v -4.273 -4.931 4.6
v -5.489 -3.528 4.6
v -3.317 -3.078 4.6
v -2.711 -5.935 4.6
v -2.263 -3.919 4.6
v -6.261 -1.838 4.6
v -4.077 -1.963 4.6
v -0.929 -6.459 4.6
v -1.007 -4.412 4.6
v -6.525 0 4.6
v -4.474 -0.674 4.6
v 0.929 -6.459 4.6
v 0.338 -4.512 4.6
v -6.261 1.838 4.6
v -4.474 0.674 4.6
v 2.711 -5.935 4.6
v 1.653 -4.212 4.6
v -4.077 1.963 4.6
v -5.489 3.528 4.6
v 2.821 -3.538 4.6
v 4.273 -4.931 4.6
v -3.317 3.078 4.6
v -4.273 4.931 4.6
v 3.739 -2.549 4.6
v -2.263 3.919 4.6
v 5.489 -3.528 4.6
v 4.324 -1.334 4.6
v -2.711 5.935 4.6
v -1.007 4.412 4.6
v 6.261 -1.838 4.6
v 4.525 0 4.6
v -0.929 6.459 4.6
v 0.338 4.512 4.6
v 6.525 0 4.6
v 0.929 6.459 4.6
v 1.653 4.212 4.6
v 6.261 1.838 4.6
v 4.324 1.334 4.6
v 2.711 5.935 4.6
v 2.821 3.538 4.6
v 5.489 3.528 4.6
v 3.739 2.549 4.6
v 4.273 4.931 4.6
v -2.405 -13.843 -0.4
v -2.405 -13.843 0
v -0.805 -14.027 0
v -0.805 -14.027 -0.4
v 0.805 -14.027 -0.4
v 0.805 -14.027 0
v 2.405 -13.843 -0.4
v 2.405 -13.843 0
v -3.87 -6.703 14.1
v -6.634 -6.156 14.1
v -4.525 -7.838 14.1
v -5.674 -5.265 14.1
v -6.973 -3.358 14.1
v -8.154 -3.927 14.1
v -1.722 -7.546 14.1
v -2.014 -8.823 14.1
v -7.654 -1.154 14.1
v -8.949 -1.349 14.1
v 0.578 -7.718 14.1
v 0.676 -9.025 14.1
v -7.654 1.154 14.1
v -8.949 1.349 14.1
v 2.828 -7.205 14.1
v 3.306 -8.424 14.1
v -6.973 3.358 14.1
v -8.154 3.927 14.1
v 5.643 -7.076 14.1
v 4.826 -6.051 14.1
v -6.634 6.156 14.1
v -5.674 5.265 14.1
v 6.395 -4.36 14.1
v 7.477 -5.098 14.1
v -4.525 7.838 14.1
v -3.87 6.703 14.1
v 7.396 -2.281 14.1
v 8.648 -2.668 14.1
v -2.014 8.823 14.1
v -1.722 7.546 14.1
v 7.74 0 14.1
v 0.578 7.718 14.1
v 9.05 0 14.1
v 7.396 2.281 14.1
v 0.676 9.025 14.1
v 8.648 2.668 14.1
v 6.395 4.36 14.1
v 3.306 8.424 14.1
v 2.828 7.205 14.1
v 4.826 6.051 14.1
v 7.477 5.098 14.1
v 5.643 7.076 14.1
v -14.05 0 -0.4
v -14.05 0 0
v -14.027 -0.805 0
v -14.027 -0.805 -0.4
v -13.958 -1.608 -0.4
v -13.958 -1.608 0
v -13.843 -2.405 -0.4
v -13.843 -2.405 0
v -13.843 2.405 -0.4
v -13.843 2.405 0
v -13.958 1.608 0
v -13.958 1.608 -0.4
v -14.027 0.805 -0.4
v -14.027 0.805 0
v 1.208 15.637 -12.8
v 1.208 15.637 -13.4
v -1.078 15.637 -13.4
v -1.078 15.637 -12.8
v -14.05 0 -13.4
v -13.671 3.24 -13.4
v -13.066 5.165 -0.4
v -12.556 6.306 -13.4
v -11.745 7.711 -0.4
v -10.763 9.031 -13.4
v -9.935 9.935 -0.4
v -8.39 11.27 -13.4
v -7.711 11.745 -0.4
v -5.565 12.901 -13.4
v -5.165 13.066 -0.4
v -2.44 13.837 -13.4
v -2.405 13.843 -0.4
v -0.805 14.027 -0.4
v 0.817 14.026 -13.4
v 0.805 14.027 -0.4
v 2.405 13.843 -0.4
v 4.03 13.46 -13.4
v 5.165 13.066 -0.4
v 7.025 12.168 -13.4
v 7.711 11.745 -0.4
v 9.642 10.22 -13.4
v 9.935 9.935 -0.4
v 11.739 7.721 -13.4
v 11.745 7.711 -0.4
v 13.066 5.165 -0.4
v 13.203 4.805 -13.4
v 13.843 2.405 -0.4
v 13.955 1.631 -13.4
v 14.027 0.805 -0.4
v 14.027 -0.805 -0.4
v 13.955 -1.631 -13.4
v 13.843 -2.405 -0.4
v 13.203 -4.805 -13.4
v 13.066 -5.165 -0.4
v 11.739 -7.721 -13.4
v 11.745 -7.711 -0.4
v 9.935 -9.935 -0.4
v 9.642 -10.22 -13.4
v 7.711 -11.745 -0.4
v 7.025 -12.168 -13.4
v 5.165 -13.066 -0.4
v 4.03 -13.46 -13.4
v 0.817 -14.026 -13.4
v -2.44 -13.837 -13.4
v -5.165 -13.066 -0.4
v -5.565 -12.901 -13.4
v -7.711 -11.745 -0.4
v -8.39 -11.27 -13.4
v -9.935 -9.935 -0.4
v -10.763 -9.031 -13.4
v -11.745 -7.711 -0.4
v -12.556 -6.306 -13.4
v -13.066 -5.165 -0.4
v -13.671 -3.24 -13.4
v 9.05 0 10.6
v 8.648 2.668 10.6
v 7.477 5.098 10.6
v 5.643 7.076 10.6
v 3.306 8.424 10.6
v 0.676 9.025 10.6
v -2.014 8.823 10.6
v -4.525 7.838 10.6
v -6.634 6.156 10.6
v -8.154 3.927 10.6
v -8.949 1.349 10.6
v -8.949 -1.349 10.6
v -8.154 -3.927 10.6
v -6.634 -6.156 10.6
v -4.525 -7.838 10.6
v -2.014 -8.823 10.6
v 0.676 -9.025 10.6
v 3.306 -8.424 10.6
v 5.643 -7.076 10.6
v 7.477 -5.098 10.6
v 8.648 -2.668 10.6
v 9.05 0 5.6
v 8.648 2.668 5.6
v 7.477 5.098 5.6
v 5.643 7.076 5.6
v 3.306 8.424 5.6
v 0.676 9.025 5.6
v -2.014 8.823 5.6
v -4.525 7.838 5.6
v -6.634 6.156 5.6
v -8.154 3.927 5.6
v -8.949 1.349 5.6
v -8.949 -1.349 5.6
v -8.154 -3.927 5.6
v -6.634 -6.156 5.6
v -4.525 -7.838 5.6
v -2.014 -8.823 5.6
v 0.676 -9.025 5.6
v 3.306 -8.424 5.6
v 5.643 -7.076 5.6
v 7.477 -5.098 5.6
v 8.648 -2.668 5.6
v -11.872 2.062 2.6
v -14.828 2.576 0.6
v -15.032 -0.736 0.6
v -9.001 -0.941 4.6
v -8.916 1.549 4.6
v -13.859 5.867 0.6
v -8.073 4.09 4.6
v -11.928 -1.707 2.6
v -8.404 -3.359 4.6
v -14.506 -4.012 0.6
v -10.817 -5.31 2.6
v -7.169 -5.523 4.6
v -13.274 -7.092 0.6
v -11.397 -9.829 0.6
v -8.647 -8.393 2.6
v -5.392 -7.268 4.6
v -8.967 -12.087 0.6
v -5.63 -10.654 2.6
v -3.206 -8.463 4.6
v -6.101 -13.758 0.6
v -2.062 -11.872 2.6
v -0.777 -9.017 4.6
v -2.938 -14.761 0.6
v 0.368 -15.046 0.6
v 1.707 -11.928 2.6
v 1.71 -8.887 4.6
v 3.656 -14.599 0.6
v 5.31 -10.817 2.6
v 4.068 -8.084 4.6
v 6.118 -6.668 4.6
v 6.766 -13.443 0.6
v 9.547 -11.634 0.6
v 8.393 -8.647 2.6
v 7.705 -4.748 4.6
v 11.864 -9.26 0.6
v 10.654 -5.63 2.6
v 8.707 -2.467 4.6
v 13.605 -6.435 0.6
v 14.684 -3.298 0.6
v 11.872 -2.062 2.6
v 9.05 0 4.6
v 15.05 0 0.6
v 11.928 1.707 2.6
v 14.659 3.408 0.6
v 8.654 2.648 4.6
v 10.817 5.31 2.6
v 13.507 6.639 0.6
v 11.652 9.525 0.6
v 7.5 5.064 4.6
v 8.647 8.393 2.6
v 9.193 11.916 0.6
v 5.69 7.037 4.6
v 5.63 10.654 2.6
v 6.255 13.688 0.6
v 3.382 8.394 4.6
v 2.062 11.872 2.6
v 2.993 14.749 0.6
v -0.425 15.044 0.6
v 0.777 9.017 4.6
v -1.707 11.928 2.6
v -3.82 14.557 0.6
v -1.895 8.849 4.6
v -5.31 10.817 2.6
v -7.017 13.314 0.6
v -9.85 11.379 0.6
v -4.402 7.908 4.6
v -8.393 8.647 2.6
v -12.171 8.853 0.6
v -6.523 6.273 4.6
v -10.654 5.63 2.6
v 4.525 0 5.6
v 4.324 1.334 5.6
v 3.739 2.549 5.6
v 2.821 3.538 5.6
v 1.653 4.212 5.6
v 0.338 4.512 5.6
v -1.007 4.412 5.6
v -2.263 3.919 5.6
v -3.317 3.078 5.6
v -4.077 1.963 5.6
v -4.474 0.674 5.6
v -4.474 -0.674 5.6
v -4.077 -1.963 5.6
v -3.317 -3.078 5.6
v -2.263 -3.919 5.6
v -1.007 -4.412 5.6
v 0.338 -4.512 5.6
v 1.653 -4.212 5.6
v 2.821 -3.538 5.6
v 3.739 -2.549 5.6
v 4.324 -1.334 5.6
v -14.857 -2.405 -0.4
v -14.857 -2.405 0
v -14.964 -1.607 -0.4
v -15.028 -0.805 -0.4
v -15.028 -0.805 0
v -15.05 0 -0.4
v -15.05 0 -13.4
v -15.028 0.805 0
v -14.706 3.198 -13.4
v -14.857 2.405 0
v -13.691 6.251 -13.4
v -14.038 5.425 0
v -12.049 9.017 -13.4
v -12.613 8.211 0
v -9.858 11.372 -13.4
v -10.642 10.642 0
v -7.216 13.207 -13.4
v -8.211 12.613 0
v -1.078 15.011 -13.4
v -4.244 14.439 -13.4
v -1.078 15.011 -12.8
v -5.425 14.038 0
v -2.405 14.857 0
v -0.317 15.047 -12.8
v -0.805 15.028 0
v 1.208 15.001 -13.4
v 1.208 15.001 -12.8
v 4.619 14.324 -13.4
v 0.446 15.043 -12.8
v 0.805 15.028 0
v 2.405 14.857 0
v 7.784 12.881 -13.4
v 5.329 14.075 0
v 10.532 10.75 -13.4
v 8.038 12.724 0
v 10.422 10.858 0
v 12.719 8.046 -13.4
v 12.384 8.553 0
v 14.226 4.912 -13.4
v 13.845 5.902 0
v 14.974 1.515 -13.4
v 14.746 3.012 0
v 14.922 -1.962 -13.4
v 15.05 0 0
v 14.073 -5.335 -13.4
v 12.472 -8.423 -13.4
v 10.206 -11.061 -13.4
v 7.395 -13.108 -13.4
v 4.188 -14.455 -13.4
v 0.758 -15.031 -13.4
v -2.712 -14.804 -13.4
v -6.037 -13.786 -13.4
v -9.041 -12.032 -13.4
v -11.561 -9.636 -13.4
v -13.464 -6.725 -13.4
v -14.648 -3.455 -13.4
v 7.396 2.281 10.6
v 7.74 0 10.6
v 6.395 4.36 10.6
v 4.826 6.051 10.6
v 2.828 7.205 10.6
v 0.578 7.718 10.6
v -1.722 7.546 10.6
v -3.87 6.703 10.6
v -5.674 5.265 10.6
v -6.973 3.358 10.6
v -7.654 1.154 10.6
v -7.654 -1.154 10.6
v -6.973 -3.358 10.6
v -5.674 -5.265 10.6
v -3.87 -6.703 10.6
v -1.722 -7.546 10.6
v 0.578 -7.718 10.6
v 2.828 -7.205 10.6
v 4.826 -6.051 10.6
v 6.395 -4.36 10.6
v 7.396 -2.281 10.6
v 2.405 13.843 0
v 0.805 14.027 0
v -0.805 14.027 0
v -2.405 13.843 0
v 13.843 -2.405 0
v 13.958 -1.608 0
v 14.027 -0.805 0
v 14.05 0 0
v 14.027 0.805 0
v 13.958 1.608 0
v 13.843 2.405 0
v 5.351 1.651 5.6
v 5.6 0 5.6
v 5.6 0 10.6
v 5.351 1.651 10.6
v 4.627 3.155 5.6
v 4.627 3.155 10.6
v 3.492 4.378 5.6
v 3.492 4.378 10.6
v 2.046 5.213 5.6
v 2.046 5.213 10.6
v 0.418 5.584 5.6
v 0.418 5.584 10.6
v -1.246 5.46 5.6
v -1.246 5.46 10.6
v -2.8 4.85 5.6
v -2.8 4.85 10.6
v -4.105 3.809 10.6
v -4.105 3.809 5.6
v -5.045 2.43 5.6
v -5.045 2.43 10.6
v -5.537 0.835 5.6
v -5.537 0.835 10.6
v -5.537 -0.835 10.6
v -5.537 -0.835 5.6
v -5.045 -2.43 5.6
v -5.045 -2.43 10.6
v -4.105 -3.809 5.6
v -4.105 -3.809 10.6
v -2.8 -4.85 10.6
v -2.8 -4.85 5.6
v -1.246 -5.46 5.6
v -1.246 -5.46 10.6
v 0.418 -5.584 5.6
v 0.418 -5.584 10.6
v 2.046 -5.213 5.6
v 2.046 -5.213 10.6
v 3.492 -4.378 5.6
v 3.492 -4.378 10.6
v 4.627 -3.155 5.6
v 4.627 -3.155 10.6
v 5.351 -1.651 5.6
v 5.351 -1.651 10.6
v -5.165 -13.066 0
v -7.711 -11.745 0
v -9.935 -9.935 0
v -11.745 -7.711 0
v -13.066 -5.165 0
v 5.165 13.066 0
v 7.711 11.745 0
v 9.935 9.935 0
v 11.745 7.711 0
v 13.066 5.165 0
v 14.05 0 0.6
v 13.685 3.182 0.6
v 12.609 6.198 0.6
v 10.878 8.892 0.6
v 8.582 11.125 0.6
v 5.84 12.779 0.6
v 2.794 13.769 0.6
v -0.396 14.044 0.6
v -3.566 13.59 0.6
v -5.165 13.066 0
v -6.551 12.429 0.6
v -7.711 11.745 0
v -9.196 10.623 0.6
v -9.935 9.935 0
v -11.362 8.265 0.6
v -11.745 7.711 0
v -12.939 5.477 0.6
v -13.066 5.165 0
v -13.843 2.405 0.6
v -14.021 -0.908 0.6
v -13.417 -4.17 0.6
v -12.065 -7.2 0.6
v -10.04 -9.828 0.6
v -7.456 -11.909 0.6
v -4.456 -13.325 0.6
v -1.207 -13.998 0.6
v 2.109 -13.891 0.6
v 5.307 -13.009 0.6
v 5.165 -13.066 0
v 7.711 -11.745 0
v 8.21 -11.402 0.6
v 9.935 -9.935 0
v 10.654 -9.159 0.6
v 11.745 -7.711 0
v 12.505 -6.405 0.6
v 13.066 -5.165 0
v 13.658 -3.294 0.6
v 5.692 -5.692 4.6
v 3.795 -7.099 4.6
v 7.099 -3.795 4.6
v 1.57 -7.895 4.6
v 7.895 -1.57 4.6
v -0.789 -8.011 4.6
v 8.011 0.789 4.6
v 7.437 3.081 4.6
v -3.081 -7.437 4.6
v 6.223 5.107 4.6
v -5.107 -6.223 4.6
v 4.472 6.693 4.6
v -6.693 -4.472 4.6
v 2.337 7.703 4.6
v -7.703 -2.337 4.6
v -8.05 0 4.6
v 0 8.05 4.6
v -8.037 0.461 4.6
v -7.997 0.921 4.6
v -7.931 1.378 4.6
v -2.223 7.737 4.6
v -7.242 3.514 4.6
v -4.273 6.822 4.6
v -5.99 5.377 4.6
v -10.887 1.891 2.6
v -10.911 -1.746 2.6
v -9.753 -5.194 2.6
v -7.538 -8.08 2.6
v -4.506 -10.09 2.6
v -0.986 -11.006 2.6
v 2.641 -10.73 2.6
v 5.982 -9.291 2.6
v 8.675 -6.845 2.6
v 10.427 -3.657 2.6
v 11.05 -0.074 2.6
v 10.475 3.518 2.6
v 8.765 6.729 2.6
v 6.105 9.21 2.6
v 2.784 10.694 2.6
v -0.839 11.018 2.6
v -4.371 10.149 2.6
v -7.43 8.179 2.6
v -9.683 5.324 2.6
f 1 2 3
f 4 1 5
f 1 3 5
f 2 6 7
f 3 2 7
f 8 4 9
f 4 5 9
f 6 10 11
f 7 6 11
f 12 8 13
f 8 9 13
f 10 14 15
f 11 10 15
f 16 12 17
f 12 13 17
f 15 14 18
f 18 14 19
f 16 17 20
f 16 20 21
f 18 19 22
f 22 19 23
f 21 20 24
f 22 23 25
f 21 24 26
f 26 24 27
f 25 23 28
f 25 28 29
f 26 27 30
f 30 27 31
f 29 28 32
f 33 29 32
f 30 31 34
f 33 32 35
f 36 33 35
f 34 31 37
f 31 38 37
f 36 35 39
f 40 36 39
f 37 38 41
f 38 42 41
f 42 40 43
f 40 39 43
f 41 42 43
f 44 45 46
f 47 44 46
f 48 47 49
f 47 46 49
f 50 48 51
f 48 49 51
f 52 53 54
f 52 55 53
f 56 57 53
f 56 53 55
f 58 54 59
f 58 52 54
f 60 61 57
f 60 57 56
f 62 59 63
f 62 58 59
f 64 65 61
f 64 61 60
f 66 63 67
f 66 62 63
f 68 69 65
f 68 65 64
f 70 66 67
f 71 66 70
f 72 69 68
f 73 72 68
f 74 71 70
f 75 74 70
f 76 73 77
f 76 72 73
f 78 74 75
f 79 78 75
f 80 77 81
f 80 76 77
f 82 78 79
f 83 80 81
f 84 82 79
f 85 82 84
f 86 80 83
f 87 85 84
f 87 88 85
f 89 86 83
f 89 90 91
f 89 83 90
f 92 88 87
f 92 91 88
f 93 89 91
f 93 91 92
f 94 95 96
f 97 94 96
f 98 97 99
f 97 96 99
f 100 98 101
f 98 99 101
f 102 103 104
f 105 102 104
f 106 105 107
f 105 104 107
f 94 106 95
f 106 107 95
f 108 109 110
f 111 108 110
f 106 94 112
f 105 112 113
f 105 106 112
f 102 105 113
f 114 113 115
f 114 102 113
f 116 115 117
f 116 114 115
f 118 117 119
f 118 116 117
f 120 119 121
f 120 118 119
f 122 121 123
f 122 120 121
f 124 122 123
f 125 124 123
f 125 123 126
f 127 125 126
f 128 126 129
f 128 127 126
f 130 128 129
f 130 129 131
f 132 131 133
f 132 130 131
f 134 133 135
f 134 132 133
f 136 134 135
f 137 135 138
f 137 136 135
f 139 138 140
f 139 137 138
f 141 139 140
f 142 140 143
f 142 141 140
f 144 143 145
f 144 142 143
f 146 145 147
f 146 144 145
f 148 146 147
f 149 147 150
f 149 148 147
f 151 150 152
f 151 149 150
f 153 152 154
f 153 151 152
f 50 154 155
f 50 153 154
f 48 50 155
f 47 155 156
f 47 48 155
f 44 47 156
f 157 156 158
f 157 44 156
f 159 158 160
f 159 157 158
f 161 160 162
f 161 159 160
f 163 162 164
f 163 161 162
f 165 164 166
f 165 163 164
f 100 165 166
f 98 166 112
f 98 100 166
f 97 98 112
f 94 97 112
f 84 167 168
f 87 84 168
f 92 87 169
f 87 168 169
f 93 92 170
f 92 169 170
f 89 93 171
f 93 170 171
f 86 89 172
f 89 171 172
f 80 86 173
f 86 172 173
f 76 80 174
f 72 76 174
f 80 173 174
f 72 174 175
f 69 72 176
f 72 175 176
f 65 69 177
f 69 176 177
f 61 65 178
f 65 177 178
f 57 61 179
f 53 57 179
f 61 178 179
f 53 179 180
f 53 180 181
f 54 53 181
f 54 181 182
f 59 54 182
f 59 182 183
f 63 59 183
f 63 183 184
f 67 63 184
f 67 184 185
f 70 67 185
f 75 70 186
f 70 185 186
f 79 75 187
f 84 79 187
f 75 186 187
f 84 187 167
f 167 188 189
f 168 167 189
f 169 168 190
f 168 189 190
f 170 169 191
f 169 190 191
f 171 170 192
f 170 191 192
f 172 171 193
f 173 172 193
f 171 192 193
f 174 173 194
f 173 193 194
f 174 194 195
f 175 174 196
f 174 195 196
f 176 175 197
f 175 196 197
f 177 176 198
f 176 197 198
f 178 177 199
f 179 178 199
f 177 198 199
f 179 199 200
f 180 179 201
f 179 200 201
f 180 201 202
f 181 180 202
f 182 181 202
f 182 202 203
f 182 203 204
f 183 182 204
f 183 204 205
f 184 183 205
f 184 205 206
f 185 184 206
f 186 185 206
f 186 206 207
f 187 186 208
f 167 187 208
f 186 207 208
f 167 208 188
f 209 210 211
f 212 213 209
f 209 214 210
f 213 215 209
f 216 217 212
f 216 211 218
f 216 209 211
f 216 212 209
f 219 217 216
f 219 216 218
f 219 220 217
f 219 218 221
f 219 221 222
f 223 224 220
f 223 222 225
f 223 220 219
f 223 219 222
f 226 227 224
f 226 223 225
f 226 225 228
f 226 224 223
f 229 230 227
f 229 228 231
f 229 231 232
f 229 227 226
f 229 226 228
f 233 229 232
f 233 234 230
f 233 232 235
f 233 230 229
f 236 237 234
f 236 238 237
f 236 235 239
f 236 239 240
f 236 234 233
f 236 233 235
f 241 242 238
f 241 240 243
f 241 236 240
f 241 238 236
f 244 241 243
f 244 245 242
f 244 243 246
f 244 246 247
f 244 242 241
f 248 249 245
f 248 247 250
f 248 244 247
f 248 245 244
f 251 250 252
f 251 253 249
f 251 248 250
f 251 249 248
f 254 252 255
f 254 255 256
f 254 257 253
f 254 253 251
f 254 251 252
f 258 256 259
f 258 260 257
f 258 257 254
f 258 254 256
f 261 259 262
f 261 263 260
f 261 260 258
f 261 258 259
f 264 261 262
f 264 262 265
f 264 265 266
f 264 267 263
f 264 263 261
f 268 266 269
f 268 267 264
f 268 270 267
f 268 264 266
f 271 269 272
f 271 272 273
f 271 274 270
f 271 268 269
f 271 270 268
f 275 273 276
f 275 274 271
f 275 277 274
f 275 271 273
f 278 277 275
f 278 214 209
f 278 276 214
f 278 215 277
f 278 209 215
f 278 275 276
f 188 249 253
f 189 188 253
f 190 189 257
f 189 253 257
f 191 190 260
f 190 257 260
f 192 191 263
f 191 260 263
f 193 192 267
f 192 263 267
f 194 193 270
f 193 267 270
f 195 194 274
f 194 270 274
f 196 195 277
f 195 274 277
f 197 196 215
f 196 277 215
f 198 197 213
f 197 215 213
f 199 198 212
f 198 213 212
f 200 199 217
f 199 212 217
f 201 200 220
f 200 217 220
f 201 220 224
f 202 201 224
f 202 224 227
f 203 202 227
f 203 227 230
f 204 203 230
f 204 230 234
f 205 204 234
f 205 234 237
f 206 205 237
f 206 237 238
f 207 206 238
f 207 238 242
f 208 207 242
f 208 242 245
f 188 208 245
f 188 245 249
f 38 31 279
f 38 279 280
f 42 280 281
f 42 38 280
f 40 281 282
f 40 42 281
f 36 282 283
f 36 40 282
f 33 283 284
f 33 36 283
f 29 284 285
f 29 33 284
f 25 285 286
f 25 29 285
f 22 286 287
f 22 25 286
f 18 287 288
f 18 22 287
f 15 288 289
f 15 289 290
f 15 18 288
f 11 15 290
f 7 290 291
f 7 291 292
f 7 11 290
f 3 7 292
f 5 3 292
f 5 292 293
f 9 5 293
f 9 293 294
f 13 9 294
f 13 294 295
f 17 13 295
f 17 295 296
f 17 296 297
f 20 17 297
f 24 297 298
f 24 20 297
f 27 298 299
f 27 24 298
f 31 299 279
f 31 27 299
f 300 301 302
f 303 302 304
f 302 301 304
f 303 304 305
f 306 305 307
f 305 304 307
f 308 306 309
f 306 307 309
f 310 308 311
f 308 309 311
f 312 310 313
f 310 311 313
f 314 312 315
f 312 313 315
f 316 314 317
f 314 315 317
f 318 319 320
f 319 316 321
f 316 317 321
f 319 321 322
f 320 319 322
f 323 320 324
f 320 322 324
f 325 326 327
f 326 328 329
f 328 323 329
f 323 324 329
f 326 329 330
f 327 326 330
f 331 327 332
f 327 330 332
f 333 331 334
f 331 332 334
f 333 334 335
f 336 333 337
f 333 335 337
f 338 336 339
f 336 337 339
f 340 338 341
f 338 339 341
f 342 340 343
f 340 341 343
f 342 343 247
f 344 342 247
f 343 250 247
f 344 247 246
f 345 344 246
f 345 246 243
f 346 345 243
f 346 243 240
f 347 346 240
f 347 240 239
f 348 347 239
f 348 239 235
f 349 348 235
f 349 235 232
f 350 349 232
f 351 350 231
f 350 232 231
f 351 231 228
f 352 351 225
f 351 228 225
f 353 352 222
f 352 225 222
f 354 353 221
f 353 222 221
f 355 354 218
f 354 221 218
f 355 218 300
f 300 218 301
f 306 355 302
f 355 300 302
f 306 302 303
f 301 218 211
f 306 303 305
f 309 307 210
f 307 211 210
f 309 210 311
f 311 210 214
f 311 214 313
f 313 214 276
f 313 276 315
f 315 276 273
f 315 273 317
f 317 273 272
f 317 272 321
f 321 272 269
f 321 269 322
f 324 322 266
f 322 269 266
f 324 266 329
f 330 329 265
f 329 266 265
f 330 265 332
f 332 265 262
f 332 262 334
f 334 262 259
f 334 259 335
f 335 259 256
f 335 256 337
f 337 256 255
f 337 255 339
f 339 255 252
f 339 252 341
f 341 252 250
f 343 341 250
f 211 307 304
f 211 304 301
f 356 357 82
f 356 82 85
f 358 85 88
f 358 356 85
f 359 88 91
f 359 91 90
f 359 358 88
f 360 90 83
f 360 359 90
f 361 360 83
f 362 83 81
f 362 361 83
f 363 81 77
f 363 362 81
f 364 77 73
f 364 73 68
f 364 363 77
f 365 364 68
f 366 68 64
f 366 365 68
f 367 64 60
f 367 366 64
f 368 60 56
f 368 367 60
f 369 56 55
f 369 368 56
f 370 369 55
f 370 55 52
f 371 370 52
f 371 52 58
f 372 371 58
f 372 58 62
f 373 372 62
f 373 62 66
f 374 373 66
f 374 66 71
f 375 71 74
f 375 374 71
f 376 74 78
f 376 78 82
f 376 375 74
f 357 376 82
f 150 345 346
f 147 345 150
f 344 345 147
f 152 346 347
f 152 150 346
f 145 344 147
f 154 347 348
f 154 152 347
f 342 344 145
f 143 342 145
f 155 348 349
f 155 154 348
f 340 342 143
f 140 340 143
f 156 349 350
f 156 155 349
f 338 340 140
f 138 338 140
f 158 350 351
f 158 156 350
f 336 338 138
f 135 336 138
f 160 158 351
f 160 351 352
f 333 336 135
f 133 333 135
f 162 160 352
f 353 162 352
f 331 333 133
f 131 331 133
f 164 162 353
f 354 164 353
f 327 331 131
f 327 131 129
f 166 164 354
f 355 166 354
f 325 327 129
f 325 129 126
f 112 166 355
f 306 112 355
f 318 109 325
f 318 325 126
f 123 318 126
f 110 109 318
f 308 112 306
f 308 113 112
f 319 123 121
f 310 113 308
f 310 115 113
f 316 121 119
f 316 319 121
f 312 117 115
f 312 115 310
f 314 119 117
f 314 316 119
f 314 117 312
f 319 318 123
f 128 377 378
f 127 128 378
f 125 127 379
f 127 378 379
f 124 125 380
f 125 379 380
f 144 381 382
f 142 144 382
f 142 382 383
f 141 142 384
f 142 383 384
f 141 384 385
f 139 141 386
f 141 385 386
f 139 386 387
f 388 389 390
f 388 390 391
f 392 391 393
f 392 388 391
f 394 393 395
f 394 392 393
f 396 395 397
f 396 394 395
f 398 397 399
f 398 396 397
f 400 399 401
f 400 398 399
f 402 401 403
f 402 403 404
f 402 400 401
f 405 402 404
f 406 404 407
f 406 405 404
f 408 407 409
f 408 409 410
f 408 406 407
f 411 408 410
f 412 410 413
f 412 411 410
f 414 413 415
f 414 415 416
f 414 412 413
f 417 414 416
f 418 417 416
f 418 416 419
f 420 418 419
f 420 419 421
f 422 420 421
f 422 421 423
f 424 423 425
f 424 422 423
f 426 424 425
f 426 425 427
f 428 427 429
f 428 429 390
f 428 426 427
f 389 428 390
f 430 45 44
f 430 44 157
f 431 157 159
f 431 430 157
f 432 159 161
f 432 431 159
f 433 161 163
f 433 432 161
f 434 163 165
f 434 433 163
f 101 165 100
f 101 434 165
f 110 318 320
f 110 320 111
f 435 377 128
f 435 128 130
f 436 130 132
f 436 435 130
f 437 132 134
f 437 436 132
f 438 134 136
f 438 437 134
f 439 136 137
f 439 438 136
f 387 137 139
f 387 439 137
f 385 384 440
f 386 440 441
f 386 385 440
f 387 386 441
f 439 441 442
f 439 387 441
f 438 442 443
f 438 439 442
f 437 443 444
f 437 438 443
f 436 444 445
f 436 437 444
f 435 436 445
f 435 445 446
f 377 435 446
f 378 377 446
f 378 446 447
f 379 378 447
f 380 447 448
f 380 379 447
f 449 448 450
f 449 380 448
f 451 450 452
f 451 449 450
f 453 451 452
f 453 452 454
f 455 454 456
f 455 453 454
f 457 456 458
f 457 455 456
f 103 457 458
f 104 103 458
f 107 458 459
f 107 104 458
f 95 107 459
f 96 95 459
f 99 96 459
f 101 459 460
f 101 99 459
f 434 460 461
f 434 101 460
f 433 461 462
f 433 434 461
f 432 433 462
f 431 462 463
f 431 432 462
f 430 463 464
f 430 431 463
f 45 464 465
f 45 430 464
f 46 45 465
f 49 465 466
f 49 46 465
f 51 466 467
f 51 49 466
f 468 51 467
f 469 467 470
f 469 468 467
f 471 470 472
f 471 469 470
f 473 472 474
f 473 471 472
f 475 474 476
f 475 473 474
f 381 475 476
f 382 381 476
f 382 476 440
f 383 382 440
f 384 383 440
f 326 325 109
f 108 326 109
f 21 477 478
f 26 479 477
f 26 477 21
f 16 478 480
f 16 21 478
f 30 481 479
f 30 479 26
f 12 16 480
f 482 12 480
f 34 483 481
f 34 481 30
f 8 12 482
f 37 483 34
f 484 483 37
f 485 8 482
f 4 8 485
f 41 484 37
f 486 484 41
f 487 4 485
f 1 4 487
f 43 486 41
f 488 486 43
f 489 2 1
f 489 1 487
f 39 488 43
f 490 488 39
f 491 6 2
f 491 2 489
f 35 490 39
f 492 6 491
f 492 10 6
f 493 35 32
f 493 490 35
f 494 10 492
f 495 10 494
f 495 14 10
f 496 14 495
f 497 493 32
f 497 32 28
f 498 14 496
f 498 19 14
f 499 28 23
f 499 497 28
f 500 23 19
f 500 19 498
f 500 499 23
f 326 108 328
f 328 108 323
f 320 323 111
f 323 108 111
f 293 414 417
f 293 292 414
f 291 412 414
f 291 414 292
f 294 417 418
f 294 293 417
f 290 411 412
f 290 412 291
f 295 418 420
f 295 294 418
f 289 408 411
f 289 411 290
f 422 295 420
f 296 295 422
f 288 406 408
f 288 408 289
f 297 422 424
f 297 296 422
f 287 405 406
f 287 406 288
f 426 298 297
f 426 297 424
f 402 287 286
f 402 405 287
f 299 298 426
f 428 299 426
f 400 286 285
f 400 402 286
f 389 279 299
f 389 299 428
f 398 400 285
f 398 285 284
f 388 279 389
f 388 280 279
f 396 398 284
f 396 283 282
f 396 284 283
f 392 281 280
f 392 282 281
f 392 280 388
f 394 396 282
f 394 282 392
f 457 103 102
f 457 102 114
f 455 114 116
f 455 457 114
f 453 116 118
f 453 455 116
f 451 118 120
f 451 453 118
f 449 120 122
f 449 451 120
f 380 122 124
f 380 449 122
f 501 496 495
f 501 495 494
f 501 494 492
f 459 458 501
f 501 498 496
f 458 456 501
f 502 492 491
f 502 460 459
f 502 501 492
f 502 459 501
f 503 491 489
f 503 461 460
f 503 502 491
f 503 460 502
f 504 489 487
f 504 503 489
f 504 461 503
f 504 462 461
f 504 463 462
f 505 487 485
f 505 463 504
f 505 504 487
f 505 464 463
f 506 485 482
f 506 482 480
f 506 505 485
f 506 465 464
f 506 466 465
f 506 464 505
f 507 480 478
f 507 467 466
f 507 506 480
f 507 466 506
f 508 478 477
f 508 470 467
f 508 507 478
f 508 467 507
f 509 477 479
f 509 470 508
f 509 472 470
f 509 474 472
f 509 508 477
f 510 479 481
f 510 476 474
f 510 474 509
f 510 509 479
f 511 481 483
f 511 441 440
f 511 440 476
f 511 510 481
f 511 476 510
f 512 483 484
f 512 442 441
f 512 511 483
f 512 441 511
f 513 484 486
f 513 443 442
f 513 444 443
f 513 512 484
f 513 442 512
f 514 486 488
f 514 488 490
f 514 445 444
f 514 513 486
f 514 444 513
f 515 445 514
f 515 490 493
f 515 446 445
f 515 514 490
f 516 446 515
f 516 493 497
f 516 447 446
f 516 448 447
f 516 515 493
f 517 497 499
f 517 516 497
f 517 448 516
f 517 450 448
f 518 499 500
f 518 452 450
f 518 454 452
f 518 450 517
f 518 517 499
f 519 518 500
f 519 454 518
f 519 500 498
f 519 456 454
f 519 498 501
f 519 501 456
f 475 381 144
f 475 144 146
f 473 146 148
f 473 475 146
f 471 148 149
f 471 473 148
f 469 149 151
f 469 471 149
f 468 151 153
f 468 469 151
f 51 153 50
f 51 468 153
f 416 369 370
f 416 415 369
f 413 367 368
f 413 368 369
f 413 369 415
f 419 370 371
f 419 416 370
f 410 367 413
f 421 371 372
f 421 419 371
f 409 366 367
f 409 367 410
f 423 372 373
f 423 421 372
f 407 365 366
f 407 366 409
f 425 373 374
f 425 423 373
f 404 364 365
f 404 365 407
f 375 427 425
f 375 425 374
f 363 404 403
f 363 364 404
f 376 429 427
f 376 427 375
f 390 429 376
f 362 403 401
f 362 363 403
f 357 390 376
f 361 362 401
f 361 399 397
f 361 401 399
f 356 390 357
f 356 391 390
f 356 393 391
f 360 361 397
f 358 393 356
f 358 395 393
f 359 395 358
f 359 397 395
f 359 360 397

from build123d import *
from build123d.topology import SkipClean

# Parameters (mm, degrees)
CROQUIS1_R               = 15.05
CROQUIS1_R_2             = 14.05
SALIENTE_EXTRUIR1_DEPTH  = 0.6
SALIENTE_EXTRUIR2_DEPTH  = 0.4
CROQUIS5_R               = 15.05
CROQUIS5_R_2             = 14.05
SALIENTE_EXTRUIR3_DEPTH  = 0.4
CROQUIS7_R               = 15.05
CROQUIS7_R_2             = 14.05
SALIENTE_EXTRUIR4_DEPTH  = 13
CROQUIS8_W               = 2.286340663
CROQUIS8_H               = 1.122176033
SALIENTE_EXTRUIR5_DEPTH  = 0.6
CROQUIS10_R              = 6.525
CROQUIS10_R_2            = 4.525
SALIENTE_EXTRUIR6_DEPTH  = 1
CROQUIS11_R              = 9.05
CROQUIS11_R_2            = 5.6
SALIENTE_EXTRUIR7_DEPTH  = 5
CROQUIS12_R              = 9.05
CROQUIS12_R_2            = 8.05
SALIENTE_EXTRUIR9_DEPTH  = 1
CROQUIS13_R              = 9.05
CROQUIS13_R_2            = 7.74
SALIENTE_EXTRUIR10_DEPTH = 3.5
CROQUIS14_R              = 8.05
CROQUIS14_R_2            = 6.525
SALIENTE_EXTRUIR11_DEPTH = 1


with BuildPart() as part:
    # Croquis1 → Saliente-Extruir1 (new body)
    with BuildSketch(Plane.XY):
        Circle(CROQUIS1_R)
        Circle(CROQUIS1_R_2, mode=Mode.SUBTRACT)
    extrude(amount=SALIENTE_EXTRUIR1_DEPTH)

    # Croquis2 → Saliente-Extruir2 (add)
    with SkipClean():  # the faces are left unmerged after this step: merging them gives an invalid solid
        with BuildSketch(Plane(origin=(0, 0, 0), x_dir=(-1, 0, 0), z_dir=(0, 0, -1))):
            with BuildLine():
                Line((-2.404789938, 14.856631023), (-2.404789938, 13.842669011))
                ThreePointArc((-2.404789938, 13.842669011), (0, 14.05), (2.404789938, 13.842669011))
                Line((2.404789938, 13.842669011), (2.404789938, 14.856631023))
                ThreePointArc((2.404789938, 14.856631023), (0, 15.05), (-2.404789938, 14.856631023))
            make_face()
            with BuildLine():
                Line((14.856631023, 2.404789938), (13.842669011, 2.404789938))
                ThreePointArc((13.842669011, 2.404789938), (14.05, 0), (13.842669011, -2.404789938))
                Line((13.842669011, -2.404789938), (14.856631023, -2.404789938))
                ThreePointArc((14.856631023, -2.404789938), (15.05, 0), (14.856631023, 2.404789938))
            make_face()
            with BuildLine():
                Line((2.404789938, -14.856631023), (2.404789938, -13.842669011))
                ThreePointArc((2.404789938, -13.842669011), (0, -14.05), (-2.404789938, -13.842669011))
                Line((-2.404789938, -13.842669011), (-2.404789938, -14.856631023))
                ThreePointArc((-2.404789938, -14.856631023), (0, -15.05), (2.404789938, -14.856631023))
            make_face()
            with BuildLine():
                Line((-14.856631023, -2.404789938), (-13.842669011, -2.404789938))
                ThreePointArc((-13.842669011, -2.404789938), (-14.05, 0), (-13.842669011, 2.404789938))
                Line((-13.842669011, 2.404789938), (-14.856631023, 2.404789938))
                ThreePointArc((-14.856631023, 2.404789938), (-15.05, 0), (-14.856631023, -2.404789938))
            make_face()
        extrude(amount=SALIENTE_EXTRUIR2_DEPTH)

    # Croquis4 → Revolución1 (revolve)
    with SkipClean():  # the faces are left unmerged after this step: merging them gives an invalid solid
        with BuildSketch(Plane(origin=(0, 0, 0), x_dir=(0, 0, -1), z_dir=(1, 0, 0)), mode=Mode.PRIVATE) as revoluci_n1_sk:
            Polygon((-0.6, 15.05), (-4.6, 9.05), (-4.6, 8.05), (-0.6, 14.05), align=None)
        revolve(revoluci_n1_sk.sketch.rotate(Axis((0, 0, 0), (0, 0, 1)), 80.14476262), axis=Axis((0, 0, 0), (0, 0, 1)))

    # Croquis5 → Saliente-Extruir3 (add)
    with SkipClean():  # the faces are left unmerged after this step: merging them gives an invalid solid
        with BuildSketch(Plane(origin=(0, 0, 0), x_dir=(-1, 0, 0), z_dir=(0, 0, -1))):
            Circle(CROQUIS5_R)
            Circle(CROQUIS5_R_2, mode=Mode.SUBTRACT)
        extrude(amount=SALIENTE_EXTRUIR3_DEPTH)

    # Croquis7 → Saliente-Extruir4 (add)
    with SkipClean():  # the faces are left unmerged after this step: merging them gives an invalid solid
        with BuildSketch(Plane(origin=(0, 0, -0.4), x_dir=(-1, 0, 0), z_dir=(0, 0, -1))):
            Circle(CROQUIS7_R)
            Circle(CROQUIS7_R_2, mode=Mode.SUBTRACT)
        extrude(amount=SALIENTE_EXTRUIR4_DEPTH)

    # Croquis8 → Saliente-Extruir5 (add)
    with SkipClean():  # the faces are left unmerged after this step: merging them gives an invalid solid
        with BuildSketch(Plane(origin=(0, 0, -13.4), x_dir=(-1, 0, 0), z_dir=(0, 0, -1))):
            with Locations((-0.064707754, 15.075419169)):
                Rectangle(CROQUIS8_W, CROQUIS8_H)
        extrude(amount=-SALIENTE_EXTRUIR5_DEPTH)



with BuildPart() as body_2:
    # Croquis10 → Saliente-Extruir6 (new body)
    with BuildSketch(Plane.XY.offset(4.6)):
        Circle(CROQUIS10_R)
        Circle(CROQUIS10_R_2, mode=Mode.SUBTRACT)
    extrude(amount=SALIENTE_EXTRUIR6_DEPTH)

    # Croquis11 → Saliente-Extruir7 (add)
    with BuildSketch(Plane.XY.offset(5.6)):
        Circle(CROQUIS11_R)
        Circle(CROQUIS11_R_2, mode=Mode.SUBTRACT)
    extrude(amount=SALIENTE_EXTRUIR7_DEPTH)


with BuildPart() as part_1:
    with SkipClean():  # the faces are left unmerged after this step: merging them gives an invalid solid
        add(part.part)

        add(body_2.part)  # Saliente-Extruir9 merges body 2
        # Croquis12 → Saliente-Extruir9 (add)
        with BuildSketch(Plane.XY.offset(4.6)):
            Circle(CROQUIS12_R)
            with Locations(Location((0, 0, 0), (0, 0, 90))):
                Circle(CROQUIS12_R_2, mode=Mode.SUBTRACT)
        extrude(amount=SALIENTE_EXTRUIR9_DEPTH)

    # Croquis13 → Saliente-Extruir10 (add)
    with SkipClean():  # the faces are left unmerged after this step: merging them gives an invalid solid
        with BuildSketch(Plane.XY.offset(10.6)):
            Circle(CROQUIS13_R)
            Circle(CROQUIS13_R_2, mode=Mode.SUBTRACT)
        extrude(amount=SALIENTE_EXTRUIR10_DEPTH)

    # Croquis14 → Saliente-Extruir11 (add)
    with SkipClean():  # the faces are left unmerged after this step: merging them gives an invalid solid
        with BuildSketch(Plane(origin=(0, 0, 4.6), x_dir=(-1, 0, 0), z_dir=(0, 0, -1))):
            Circle(CROQUIS14_R)
            Circle(CROQUIS14_R_2, mode=Mode.SUBTRACT)
        extrude(amount=-SALIENTE_EXTRUIR11_DEPTH)


solid = part_1.part
